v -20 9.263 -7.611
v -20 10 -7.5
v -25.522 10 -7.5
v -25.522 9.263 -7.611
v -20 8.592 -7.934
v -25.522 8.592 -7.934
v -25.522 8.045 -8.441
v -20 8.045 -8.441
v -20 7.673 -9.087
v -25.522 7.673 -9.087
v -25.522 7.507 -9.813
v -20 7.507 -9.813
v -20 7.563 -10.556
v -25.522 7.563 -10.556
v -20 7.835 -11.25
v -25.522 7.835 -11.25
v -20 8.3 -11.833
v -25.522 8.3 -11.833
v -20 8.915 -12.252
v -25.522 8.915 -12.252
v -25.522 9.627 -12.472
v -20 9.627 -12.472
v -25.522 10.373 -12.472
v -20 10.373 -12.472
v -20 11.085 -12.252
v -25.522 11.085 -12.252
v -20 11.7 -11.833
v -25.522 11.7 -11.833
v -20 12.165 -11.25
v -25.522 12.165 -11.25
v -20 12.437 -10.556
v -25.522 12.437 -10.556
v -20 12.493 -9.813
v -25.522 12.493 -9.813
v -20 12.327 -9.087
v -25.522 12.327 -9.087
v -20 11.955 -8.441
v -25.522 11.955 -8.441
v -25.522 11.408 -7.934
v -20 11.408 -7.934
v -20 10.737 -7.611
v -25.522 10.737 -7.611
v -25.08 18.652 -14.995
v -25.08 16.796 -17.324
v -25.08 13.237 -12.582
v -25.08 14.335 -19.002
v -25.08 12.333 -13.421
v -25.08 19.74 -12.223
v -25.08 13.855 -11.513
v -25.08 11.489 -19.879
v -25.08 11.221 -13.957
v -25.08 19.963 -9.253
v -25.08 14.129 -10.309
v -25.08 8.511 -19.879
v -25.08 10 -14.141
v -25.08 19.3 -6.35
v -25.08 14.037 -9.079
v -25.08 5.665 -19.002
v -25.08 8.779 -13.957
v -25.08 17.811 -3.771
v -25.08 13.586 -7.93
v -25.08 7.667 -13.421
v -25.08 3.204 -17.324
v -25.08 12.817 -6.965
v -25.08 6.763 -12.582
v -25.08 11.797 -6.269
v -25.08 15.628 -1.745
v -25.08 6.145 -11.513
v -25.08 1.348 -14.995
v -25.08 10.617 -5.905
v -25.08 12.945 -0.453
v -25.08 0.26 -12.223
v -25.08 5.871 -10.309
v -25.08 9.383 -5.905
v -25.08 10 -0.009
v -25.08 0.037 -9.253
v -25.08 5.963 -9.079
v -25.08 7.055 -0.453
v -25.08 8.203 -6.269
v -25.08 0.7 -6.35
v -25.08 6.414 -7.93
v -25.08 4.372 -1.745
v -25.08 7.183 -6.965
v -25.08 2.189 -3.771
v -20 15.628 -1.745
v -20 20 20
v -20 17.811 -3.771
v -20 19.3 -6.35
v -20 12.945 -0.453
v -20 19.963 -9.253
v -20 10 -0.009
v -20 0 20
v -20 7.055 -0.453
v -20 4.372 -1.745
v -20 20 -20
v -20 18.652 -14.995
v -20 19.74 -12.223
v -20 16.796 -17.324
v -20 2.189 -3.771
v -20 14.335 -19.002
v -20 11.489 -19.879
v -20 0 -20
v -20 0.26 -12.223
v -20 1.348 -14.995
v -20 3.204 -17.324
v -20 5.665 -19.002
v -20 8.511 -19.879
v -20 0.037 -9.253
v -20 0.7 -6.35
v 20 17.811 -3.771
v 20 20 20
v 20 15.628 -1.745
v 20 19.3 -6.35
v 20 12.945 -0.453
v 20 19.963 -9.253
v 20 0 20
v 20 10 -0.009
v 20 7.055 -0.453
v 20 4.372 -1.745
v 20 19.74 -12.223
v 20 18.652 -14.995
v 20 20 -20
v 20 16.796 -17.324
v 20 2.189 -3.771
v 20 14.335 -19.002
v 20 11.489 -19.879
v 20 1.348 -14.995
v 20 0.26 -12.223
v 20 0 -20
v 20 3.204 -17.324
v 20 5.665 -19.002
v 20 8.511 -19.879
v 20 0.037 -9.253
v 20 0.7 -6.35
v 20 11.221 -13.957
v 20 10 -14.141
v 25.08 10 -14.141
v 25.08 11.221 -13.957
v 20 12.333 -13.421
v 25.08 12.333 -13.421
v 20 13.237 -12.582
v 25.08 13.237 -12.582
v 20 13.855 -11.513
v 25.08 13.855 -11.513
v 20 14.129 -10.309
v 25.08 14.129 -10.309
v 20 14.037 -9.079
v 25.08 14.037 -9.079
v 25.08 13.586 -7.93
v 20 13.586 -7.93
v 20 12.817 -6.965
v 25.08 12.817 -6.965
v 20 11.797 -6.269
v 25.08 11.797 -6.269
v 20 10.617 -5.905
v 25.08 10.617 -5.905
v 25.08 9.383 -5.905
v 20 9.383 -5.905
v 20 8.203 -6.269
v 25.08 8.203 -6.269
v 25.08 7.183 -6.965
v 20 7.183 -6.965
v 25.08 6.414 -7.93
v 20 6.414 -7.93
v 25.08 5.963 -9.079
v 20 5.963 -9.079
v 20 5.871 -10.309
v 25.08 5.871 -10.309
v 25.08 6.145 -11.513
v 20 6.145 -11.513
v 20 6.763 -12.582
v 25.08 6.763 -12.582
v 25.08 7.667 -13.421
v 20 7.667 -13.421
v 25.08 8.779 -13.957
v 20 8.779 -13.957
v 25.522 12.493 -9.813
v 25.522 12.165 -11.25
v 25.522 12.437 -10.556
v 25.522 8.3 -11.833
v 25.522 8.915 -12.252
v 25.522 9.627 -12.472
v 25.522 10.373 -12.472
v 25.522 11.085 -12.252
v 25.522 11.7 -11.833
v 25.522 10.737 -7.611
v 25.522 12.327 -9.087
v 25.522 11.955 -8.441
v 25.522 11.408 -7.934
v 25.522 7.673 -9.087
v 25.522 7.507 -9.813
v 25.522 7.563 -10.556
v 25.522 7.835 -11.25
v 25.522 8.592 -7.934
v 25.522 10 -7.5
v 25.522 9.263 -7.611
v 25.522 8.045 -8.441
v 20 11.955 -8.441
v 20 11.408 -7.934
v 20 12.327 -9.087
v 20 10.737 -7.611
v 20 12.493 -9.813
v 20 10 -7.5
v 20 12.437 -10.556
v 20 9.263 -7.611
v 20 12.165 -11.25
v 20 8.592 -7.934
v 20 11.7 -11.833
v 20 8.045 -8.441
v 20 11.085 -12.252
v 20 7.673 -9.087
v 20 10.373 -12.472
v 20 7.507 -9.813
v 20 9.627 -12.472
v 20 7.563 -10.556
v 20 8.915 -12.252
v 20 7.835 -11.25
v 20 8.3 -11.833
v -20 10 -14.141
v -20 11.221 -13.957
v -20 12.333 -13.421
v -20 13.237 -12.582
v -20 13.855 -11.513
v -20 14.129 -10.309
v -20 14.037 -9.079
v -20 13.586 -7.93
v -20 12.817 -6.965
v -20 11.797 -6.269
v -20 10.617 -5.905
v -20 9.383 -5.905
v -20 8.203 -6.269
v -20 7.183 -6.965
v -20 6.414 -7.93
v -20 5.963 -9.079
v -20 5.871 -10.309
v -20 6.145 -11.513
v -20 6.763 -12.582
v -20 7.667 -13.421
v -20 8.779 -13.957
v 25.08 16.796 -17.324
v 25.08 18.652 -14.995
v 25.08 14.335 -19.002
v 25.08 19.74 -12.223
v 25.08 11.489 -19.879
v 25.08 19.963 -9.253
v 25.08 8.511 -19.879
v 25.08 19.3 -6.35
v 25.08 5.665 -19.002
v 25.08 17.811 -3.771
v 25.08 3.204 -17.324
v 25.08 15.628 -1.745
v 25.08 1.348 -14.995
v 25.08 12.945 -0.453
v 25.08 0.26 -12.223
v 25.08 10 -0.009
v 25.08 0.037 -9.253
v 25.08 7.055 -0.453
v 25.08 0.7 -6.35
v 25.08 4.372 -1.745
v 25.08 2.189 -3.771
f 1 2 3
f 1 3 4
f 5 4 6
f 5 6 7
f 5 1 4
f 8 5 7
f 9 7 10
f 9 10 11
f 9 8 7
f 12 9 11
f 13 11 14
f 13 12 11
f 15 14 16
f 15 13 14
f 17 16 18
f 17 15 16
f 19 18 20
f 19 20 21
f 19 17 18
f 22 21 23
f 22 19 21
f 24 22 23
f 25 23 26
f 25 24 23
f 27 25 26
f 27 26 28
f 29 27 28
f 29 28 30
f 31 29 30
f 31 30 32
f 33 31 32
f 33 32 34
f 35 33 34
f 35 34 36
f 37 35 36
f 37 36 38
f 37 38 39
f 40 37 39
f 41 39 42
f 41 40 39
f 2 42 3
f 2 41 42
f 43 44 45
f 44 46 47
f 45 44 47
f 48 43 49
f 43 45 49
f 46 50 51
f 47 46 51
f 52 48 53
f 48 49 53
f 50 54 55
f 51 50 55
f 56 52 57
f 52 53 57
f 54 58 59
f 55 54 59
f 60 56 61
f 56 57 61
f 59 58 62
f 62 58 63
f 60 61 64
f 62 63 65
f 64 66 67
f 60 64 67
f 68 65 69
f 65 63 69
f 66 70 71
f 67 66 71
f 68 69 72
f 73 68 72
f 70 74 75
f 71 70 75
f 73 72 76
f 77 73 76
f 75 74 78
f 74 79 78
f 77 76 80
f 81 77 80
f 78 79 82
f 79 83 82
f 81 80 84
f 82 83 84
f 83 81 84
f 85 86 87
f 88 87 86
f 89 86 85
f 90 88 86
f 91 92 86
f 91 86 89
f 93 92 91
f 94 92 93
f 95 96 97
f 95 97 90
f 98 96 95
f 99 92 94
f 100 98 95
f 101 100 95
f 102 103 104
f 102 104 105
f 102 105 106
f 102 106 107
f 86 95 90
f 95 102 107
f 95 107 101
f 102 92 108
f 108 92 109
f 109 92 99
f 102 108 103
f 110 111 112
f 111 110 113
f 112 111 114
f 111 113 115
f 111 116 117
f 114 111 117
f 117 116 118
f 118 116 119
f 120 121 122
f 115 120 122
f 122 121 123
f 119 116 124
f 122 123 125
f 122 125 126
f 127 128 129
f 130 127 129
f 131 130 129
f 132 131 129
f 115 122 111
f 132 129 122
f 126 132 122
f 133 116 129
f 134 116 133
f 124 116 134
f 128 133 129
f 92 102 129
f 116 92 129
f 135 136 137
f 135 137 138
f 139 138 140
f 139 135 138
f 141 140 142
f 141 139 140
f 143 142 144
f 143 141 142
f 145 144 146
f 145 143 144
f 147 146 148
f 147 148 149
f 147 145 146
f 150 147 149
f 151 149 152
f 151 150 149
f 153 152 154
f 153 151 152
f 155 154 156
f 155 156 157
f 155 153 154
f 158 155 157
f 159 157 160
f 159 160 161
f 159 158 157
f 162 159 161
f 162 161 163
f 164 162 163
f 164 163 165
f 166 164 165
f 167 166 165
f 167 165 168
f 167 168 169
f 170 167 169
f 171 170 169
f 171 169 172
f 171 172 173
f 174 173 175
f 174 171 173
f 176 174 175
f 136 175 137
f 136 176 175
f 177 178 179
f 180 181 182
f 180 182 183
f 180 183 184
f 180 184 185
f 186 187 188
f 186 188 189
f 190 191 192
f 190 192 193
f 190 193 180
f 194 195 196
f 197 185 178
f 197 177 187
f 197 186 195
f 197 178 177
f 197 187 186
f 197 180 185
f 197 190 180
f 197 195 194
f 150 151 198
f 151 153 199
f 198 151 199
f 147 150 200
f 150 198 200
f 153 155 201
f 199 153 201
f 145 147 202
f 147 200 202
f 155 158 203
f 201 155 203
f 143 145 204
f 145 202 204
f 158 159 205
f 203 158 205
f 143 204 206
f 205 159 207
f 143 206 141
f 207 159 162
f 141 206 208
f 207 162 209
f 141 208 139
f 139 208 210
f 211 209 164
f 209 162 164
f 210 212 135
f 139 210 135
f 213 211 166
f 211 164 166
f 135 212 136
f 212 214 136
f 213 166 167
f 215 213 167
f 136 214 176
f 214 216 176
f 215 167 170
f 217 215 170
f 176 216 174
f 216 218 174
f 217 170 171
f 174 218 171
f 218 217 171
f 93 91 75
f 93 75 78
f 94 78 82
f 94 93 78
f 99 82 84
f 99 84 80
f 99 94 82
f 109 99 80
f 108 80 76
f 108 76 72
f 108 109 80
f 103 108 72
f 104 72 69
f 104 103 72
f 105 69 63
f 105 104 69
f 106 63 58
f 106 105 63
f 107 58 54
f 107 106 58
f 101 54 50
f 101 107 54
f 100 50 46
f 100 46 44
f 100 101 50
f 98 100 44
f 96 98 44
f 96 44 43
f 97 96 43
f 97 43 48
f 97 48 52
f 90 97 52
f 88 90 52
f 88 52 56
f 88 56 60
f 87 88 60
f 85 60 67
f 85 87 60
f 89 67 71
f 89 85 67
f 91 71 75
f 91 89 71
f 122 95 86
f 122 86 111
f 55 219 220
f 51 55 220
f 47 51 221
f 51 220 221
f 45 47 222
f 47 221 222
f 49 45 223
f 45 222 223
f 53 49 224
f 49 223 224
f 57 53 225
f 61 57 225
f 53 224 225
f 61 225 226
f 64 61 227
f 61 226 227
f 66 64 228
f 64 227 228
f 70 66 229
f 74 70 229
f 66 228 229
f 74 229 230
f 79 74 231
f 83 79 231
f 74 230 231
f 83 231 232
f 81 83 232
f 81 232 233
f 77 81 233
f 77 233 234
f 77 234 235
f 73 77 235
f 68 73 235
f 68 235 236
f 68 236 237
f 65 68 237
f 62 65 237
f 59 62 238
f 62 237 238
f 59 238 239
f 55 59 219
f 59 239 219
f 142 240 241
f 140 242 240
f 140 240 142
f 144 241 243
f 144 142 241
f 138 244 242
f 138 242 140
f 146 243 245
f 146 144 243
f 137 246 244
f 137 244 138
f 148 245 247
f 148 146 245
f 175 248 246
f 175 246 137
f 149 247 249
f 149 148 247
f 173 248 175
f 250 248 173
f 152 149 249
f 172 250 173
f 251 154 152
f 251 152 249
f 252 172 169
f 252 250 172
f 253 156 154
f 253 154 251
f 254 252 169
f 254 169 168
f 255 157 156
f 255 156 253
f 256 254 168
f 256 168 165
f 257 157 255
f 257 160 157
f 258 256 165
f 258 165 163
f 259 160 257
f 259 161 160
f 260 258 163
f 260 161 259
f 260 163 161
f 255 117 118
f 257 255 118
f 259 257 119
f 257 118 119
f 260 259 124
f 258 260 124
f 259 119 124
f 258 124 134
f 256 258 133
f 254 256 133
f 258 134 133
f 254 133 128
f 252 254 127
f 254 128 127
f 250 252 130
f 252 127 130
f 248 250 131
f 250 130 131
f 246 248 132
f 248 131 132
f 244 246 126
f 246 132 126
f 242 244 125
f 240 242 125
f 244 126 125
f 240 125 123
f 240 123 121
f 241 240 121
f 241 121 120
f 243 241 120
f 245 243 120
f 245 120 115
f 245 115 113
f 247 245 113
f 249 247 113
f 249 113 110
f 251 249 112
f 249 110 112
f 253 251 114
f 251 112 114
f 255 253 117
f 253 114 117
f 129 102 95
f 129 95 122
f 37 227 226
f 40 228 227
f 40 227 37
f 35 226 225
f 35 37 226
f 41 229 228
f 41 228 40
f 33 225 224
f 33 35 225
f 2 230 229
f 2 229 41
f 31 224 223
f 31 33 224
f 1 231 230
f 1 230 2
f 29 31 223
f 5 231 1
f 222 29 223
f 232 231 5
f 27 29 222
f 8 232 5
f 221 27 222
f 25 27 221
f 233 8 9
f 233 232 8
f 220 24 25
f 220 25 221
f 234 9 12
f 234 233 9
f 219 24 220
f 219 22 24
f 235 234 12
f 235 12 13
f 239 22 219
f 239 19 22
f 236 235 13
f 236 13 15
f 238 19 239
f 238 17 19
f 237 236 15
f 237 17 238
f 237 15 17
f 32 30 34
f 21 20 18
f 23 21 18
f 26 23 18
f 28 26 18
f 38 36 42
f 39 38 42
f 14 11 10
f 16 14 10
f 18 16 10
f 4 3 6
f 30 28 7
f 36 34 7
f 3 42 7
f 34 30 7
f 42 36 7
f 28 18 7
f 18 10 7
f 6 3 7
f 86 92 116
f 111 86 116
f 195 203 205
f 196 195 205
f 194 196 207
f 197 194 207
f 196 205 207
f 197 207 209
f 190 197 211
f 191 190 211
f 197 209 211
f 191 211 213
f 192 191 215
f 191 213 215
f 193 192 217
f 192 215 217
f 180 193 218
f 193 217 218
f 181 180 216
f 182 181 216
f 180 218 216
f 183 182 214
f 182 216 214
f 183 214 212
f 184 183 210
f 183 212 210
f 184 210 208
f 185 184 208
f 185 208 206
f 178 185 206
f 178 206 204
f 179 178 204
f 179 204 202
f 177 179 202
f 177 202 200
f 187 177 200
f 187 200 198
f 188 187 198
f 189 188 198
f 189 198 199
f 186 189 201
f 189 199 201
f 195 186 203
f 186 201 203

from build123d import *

# Parameters (mm, degrees)
SKETCH1_W           = 40
SKETCH1_H           = 40
BOSS_EXTRUDE1_DEPTH = 20
SKETCH2_R           = 2.5
BOSS_EXTRUDE2_DEPTH = 5.522
SKETCH5_R           = 9.990957645
SKETCH5_R_2         = 4.140871972
BOSS_EXTRUDE5_DEPTH = 5.08


with BuildPart() as part:
    # Sketch1 → Boss-Extrude1 (new body)
    with BuildSketch(Plane(origin=(0, 0, 0), x_dir=(1, 0, 0), z_dir=(0, 1, 0))):
        Rectangle(SKETCH1_W, SKETCH1_H)
    extrude(amount=BOSS_EXTRUDE1_DEPTH)

    # Sketch2 → Boss-Extrude2 (add)
    with BuildSketch(Plane(origin=(20, 0, 0), x_dir=(0, 0, -1), z_dir=(1, 0, 0))):
        with Locations((10, 10)):
            Circle(SKETCH2_R)
    boss_extrude2 = extrude(amount=BOSS_EXTRUDE2_DEPTH)

    # Mirror1: Boss-Extrude2 across plane
    add(boss_extrude2.mirror(Plane(origin=(0, 0, 0), x_dir=(0, 0, 1), z_dir=(1, 0, 0))))

    # Sketch5 → Boss-Extrude5 (add)
    with BuildSketch(Plane(origin=(20, 0, 0), x_dir=(0, 0, -1), z_dir=(1, 0, 0))):
        with Locations((10, 10)):
            Circle(SKETCH5_R)
        with Locations((10, 10)):
            Circle(SKETCH5_R_2, mode=Mode.SUBTRACT)
    boss_extrude5 = extrude(amount=BOSS_EXTRUDE5_DEPTH)

    # Mirror2: Boss-Extrude5 across plane
    add(boss_extrude5.mirror(Plane(origin=(0, 0, 0), x_dir=(0, 0, 1), z_dir=(1, 0, 0))))


solid = part.part
